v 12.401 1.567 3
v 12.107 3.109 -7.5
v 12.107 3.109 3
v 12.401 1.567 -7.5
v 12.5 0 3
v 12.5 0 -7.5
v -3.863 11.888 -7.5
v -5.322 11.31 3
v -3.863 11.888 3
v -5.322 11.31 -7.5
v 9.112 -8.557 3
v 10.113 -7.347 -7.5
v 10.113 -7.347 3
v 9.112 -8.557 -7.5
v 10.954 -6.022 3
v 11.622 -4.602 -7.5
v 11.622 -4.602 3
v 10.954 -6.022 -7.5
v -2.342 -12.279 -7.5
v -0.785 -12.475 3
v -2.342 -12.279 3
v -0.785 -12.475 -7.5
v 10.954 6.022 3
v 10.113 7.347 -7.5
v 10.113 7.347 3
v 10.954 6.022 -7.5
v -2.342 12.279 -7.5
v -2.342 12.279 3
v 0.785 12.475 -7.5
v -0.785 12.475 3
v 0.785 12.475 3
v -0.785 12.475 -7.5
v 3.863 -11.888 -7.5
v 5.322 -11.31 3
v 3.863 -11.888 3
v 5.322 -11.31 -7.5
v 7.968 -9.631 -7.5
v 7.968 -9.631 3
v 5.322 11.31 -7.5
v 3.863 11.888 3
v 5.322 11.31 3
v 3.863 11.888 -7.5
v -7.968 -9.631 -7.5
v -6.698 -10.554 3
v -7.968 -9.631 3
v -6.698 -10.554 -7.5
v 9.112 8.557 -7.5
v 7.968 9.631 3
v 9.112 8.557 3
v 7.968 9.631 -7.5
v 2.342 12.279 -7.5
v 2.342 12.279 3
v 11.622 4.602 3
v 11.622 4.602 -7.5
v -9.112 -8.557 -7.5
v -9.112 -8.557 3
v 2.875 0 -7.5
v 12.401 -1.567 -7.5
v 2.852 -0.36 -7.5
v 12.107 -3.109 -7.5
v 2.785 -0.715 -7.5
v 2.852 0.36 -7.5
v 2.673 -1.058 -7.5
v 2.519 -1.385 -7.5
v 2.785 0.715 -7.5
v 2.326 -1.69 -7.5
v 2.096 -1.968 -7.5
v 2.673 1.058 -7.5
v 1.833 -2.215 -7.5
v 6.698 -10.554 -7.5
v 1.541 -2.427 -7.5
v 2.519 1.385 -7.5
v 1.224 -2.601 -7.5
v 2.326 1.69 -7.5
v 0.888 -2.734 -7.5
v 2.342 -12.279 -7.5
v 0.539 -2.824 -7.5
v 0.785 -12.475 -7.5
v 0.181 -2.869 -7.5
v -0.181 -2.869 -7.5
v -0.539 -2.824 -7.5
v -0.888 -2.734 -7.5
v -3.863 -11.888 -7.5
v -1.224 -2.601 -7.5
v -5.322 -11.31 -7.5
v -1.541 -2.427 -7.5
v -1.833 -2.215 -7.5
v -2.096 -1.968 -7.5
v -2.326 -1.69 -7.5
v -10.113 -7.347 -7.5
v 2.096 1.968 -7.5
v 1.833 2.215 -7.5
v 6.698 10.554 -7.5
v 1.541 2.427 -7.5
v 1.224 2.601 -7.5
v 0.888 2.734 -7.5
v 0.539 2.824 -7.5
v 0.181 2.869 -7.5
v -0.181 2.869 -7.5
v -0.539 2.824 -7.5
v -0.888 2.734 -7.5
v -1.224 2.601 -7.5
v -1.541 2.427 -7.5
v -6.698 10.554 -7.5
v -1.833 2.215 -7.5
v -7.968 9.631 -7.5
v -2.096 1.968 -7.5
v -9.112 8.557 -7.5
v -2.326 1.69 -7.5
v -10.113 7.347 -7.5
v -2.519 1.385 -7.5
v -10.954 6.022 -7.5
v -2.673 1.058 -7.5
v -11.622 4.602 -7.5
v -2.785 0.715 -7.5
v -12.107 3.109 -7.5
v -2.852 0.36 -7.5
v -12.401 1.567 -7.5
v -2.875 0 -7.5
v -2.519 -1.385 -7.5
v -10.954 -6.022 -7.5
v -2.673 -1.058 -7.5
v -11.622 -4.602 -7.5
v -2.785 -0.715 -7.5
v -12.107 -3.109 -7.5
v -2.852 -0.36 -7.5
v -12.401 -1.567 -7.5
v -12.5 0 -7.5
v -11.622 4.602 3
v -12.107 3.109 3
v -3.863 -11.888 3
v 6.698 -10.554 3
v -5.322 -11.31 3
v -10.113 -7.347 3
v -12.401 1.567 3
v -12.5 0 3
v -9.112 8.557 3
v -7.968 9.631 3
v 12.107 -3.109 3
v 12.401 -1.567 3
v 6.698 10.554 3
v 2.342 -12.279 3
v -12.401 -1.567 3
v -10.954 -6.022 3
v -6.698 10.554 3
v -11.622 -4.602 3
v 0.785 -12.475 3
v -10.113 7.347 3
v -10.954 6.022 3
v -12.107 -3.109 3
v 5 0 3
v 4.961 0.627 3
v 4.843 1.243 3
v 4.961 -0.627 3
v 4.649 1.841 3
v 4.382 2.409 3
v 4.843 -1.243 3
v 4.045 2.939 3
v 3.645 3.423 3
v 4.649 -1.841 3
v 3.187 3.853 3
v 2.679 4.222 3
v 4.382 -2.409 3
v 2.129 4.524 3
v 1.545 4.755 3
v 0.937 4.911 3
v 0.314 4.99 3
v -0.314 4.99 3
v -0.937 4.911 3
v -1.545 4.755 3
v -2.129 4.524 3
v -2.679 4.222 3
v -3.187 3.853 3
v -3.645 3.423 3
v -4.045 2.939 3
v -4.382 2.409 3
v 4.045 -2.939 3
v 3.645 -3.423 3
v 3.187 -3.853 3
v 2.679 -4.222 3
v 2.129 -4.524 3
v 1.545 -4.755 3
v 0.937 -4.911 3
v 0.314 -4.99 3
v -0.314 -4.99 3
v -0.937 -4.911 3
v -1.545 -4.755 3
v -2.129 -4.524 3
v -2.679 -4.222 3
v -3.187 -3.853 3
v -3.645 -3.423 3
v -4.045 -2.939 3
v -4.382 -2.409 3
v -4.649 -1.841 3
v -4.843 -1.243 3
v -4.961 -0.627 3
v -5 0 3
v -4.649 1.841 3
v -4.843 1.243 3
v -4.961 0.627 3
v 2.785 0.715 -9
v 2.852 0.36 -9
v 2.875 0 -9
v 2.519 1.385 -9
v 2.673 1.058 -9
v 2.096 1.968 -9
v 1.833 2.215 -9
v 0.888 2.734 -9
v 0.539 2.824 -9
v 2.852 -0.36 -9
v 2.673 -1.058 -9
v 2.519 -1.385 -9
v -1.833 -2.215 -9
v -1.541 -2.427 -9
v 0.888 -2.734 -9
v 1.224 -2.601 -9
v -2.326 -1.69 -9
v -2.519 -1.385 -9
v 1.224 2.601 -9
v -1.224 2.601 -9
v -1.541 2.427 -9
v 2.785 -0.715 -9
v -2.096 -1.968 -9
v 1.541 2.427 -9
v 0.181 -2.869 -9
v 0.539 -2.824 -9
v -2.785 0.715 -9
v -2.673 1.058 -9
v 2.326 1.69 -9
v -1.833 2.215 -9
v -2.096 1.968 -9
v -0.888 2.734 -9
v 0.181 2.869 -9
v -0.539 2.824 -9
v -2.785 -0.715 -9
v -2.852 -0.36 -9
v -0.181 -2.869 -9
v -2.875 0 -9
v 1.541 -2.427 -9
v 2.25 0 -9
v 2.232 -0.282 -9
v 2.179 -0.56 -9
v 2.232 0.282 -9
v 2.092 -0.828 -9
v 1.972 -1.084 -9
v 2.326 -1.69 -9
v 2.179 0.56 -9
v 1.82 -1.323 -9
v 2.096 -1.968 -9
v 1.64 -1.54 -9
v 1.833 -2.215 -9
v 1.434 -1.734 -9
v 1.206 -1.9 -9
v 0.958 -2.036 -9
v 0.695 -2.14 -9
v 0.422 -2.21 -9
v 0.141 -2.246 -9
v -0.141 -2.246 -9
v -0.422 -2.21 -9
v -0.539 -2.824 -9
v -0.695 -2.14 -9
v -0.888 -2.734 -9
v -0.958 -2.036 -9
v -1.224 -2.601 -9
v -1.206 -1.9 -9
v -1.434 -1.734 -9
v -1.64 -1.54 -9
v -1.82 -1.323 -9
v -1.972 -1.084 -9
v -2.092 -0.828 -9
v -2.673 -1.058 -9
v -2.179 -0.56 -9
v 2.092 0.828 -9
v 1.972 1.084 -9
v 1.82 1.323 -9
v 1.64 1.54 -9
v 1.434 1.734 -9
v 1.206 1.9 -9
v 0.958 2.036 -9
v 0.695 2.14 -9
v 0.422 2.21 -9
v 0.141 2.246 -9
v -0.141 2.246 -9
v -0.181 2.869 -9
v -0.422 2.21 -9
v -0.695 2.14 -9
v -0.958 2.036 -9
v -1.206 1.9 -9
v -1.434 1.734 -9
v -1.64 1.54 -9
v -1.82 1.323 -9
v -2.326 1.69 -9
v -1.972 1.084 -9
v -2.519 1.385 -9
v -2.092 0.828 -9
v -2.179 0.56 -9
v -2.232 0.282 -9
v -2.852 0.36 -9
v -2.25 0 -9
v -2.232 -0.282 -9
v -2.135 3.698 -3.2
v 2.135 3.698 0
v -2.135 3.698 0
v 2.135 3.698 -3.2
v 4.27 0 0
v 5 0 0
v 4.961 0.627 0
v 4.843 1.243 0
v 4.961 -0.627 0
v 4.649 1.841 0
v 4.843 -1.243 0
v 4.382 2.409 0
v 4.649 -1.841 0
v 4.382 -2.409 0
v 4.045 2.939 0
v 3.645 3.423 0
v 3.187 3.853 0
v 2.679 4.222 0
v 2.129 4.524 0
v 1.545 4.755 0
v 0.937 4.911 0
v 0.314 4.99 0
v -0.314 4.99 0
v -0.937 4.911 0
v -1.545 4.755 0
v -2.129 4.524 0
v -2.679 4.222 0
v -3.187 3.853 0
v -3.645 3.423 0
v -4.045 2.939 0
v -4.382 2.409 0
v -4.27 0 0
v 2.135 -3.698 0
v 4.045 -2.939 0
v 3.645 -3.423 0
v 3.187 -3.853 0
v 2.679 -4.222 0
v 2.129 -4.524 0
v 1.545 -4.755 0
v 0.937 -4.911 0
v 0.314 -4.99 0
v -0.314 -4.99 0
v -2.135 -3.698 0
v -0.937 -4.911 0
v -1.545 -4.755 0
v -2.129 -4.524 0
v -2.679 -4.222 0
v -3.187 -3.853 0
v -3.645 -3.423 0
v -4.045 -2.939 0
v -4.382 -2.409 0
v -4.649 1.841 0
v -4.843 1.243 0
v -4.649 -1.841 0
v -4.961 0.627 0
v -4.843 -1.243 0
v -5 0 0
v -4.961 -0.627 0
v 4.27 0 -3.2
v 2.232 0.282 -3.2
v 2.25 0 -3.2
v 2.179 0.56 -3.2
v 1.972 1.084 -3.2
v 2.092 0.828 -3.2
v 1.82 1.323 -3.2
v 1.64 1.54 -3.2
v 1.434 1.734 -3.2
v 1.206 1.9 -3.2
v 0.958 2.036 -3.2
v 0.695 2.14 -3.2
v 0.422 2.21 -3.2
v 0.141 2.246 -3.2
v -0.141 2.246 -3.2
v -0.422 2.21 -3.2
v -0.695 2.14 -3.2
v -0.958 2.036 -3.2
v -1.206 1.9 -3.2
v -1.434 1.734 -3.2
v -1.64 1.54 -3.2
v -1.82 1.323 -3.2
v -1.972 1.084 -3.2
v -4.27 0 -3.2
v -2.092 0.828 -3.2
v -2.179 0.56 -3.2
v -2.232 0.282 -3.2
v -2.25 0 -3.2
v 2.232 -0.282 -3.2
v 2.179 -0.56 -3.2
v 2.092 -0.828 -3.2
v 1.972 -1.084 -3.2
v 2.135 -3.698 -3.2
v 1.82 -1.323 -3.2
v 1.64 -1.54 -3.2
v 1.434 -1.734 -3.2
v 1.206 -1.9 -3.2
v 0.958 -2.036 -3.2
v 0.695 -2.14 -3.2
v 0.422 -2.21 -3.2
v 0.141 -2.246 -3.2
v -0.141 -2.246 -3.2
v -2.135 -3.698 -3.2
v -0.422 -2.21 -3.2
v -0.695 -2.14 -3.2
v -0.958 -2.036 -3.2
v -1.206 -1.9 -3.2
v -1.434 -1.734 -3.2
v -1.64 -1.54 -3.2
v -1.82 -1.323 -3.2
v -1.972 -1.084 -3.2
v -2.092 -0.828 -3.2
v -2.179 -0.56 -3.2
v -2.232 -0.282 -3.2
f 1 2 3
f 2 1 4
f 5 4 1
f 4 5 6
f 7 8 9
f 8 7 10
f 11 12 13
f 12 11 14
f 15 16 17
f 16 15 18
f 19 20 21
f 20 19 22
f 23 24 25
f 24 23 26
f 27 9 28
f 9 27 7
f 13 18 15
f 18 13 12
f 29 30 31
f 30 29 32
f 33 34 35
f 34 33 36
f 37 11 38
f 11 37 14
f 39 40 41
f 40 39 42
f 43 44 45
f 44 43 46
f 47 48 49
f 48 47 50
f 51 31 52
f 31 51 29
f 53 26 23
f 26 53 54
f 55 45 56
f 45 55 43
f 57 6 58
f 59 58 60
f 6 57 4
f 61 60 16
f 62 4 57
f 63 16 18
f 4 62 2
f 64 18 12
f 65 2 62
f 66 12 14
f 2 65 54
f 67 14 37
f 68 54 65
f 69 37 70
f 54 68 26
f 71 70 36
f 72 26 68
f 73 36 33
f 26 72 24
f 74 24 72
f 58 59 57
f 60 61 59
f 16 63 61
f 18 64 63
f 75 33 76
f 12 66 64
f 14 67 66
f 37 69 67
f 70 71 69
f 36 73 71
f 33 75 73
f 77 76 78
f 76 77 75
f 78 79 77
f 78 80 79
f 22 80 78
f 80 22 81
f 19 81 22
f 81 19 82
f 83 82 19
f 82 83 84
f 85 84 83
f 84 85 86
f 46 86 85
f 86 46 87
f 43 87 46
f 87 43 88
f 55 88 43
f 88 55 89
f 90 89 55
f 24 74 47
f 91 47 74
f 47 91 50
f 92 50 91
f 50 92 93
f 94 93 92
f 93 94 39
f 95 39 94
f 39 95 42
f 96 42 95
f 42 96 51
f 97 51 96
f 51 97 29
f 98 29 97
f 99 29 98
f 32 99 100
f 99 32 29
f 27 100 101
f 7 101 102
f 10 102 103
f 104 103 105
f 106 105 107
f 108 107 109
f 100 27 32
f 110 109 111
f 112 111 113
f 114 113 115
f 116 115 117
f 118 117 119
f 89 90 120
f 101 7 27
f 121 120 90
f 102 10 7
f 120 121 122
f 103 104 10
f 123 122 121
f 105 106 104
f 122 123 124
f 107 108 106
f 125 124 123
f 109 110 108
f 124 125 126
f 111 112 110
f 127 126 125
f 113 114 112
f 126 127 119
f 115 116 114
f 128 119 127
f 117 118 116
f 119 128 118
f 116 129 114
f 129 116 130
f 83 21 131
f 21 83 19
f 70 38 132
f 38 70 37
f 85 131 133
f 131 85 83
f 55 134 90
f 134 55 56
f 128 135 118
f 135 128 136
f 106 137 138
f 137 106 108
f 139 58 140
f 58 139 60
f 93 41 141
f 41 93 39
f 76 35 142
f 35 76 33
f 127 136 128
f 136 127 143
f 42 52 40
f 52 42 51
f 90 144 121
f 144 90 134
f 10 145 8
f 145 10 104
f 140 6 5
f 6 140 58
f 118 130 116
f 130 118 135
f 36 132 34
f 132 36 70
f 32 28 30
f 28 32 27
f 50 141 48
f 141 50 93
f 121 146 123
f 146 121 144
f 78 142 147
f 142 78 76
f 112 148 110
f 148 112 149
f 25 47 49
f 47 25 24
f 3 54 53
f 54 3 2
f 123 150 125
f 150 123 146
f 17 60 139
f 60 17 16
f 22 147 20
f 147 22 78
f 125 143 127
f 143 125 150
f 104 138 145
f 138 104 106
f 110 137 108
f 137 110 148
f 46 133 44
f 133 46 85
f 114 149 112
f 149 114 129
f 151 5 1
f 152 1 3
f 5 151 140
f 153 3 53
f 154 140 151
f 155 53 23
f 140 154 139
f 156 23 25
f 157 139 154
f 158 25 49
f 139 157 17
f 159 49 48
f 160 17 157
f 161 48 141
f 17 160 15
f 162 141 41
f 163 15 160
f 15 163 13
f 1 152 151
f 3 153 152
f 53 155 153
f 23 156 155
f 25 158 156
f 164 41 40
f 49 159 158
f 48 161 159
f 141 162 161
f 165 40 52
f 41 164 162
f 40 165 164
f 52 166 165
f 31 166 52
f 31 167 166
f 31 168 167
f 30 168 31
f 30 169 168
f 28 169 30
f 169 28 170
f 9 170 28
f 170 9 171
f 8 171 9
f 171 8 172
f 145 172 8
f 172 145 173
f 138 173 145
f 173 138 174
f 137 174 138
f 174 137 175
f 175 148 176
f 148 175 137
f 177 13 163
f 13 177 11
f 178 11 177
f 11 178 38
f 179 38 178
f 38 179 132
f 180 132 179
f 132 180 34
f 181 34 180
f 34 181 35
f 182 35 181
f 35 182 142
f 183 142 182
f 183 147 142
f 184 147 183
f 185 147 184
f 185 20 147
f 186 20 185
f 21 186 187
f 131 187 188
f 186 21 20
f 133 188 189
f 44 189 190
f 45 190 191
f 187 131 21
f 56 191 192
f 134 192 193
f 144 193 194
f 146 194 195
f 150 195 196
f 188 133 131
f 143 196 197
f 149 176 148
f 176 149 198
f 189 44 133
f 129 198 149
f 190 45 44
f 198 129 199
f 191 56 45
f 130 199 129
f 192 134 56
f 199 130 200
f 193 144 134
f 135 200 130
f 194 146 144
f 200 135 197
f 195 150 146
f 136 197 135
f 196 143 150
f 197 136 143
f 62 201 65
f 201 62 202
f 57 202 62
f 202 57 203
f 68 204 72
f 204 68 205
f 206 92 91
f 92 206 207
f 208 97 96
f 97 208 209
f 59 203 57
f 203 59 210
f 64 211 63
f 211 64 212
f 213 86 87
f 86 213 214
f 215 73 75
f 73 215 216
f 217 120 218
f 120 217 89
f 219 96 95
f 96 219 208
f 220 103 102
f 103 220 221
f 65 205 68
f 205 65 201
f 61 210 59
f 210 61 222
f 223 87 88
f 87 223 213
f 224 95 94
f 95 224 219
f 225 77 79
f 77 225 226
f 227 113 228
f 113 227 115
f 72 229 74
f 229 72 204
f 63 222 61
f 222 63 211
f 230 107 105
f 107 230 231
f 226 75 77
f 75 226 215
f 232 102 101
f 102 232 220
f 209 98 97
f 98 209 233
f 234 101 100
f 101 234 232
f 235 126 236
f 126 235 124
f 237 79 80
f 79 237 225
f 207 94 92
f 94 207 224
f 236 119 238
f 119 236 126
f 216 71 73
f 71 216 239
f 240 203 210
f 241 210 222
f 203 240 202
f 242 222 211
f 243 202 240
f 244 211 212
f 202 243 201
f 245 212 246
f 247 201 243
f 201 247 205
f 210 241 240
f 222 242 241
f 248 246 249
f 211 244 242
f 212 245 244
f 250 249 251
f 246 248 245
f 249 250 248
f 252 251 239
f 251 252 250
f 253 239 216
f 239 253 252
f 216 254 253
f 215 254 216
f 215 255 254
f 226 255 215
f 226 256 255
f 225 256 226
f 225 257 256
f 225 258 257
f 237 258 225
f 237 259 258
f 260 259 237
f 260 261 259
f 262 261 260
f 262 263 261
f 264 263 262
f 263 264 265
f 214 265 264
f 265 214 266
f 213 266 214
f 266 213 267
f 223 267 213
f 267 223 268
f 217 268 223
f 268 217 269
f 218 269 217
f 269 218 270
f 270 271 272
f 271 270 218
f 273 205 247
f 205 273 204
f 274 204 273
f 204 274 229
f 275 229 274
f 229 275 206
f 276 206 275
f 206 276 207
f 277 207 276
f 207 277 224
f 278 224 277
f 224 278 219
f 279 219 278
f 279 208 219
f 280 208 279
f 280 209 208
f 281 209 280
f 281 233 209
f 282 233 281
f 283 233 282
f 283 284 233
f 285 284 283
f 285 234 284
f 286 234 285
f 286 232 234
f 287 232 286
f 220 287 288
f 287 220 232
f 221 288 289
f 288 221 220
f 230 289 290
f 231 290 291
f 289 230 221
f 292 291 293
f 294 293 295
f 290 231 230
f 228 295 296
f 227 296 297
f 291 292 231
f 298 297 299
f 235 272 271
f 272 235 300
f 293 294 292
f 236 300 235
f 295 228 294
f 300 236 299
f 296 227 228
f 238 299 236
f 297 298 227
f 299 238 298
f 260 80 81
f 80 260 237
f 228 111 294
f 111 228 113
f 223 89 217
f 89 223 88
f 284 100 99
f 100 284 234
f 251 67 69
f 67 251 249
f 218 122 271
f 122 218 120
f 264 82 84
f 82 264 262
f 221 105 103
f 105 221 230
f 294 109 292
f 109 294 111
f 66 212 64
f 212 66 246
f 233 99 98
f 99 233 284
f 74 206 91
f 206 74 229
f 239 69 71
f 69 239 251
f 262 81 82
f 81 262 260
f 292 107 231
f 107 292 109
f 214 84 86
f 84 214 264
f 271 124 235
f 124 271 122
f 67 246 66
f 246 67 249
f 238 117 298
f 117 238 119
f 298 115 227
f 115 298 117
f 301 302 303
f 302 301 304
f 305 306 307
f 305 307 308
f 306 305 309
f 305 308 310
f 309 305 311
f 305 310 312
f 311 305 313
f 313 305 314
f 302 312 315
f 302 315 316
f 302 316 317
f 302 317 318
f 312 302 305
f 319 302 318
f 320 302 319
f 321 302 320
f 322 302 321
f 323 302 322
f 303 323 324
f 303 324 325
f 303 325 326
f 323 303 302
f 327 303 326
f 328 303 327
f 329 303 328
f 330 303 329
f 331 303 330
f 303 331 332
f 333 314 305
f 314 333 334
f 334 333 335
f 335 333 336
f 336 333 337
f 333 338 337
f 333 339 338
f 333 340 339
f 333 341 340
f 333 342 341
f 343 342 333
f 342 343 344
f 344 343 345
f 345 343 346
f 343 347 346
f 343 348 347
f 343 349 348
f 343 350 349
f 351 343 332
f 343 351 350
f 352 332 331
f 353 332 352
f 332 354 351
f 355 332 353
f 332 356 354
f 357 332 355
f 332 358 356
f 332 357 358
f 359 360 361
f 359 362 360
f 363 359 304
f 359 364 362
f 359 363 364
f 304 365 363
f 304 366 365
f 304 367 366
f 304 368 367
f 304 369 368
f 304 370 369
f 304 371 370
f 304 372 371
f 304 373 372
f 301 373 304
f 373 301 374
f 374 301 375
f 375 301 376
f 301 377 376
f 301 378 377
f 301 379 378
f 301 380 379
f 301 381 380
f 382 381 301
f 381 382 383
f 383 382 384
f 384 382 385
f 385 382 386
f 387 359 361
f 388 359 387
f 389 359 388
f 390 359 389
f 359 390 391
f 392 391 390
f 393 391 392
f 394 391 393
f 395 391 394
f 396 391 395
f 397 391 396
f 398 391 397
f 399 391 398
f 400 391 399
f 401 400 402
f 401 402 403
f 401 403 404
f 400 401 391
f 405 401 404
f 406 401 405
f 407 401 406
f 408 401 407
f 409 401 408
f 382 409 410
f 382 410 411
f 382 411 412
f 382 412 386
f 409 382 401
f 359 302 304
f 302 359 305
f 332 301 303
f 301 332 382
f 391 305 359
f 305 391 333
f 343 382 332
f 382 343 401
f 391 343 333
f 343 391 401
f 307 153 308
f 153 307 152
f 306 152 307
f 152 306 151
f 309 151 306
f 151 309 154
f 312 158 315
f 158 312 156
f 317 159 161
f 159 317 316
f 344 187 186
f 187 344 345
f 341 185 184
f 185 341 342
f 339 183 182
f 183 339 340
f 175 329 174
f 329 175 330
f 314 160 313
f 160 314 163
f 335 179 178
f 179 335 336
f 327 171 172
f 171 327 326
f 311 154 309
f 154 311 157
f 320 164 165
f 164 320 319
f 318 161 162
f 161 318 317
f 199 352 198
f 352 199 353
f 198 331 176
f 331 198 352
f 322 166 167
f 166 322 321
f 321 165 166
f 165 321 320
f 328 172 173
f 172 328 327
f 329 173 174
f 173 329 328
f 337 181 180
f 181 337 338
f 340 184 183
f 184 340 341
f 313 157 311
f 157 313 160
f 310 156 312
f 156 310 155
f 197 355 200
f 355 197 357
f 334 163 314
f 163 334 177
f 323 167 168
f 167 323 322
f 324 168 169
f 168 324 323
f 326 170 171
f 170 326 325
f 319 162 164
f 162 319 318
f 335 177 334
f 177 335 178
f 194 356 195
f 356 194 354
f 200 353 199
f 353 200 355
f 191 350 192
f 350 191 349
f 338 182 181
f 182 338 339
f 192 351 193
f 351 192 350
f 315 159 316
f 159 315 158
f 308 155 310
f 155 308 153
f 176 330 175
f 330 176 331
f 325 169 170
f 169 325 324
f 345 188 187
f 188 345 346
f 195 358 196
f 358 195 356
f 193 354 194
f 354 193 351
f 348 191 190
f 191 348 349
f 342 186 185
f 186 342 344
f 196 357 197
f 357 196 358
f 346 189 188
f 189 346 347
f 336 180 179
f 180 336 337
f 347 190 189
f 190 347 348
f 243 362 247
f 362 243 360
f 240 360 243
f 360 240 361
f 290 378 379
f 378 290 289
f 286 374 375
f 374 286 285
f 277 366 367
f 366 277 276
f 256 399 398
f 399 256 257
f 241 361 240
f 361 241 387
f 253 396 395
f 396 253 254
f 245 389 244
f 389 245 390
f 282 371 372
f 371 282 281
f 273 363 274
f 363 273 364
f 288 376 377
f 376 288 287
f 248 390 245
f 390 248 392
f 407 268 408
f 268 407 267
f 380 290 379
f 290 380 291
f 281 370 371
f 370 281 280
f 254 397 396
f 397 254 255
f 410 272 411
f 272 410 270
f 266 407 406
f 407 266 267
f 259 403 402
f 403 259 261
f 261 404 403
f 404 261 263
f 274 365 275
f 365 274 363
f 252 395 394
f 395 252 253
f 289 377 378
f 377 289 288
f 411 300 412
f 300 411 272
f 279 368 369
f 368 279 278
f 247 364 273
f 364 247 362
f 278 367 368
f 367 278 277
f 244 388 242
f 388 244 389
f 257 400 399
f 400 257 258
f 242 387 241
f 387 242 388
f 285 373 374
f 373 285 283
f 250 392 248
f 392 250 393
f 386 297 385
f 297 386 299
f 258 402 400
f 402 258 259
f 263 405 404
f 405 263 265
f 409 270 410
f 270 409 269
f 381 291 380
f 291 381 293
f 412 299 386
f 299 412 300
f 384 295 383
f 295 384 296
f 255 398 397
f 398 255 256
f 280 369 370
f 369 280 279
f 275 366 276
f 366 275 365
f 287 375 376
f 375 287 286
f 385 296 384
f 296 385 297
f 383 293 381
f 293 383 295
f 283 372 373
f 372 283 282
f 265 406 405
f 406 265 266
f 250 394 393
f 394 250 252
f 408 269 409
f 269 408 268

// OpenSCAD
$fn = 50;

difference() {
	union() {
		translate(v = [0, 0, -7.5]) {
			cylinder(h = 10.5, r = 12.5);
		}
		#translate(v = [0, 0, -9.0]) {
			cylinder(h = 9, r = 2.875);
		}
	}
	union() {
		translate(v = [0, 0, 0]) {
			rotate(a = [0, 0, 0]) {
				difference() {
					union() {
						translate(v = [0, 0, -3.2]) {
							linear_extrude(height = 3.2) {
								polygon(points = [[4.2698, 0.0], [2.1349000000000005, 3.697755269078796], [-2.134899999999999, 3.6977552690787965], [-4.2698, 5.228996902999369e-16], [-2.134900000000002, -3.6977552690787956], [2.1348999999999974, -3.697755269078798]]);
							}
						}
					}
					union();
				}
			}
		}
		#cylinder(h = 3, r = 5.0);
		#translate(v = [0, 0, -100.0]) {
			cylinder(h = 200, r = 2.25);
		}
	}
}
